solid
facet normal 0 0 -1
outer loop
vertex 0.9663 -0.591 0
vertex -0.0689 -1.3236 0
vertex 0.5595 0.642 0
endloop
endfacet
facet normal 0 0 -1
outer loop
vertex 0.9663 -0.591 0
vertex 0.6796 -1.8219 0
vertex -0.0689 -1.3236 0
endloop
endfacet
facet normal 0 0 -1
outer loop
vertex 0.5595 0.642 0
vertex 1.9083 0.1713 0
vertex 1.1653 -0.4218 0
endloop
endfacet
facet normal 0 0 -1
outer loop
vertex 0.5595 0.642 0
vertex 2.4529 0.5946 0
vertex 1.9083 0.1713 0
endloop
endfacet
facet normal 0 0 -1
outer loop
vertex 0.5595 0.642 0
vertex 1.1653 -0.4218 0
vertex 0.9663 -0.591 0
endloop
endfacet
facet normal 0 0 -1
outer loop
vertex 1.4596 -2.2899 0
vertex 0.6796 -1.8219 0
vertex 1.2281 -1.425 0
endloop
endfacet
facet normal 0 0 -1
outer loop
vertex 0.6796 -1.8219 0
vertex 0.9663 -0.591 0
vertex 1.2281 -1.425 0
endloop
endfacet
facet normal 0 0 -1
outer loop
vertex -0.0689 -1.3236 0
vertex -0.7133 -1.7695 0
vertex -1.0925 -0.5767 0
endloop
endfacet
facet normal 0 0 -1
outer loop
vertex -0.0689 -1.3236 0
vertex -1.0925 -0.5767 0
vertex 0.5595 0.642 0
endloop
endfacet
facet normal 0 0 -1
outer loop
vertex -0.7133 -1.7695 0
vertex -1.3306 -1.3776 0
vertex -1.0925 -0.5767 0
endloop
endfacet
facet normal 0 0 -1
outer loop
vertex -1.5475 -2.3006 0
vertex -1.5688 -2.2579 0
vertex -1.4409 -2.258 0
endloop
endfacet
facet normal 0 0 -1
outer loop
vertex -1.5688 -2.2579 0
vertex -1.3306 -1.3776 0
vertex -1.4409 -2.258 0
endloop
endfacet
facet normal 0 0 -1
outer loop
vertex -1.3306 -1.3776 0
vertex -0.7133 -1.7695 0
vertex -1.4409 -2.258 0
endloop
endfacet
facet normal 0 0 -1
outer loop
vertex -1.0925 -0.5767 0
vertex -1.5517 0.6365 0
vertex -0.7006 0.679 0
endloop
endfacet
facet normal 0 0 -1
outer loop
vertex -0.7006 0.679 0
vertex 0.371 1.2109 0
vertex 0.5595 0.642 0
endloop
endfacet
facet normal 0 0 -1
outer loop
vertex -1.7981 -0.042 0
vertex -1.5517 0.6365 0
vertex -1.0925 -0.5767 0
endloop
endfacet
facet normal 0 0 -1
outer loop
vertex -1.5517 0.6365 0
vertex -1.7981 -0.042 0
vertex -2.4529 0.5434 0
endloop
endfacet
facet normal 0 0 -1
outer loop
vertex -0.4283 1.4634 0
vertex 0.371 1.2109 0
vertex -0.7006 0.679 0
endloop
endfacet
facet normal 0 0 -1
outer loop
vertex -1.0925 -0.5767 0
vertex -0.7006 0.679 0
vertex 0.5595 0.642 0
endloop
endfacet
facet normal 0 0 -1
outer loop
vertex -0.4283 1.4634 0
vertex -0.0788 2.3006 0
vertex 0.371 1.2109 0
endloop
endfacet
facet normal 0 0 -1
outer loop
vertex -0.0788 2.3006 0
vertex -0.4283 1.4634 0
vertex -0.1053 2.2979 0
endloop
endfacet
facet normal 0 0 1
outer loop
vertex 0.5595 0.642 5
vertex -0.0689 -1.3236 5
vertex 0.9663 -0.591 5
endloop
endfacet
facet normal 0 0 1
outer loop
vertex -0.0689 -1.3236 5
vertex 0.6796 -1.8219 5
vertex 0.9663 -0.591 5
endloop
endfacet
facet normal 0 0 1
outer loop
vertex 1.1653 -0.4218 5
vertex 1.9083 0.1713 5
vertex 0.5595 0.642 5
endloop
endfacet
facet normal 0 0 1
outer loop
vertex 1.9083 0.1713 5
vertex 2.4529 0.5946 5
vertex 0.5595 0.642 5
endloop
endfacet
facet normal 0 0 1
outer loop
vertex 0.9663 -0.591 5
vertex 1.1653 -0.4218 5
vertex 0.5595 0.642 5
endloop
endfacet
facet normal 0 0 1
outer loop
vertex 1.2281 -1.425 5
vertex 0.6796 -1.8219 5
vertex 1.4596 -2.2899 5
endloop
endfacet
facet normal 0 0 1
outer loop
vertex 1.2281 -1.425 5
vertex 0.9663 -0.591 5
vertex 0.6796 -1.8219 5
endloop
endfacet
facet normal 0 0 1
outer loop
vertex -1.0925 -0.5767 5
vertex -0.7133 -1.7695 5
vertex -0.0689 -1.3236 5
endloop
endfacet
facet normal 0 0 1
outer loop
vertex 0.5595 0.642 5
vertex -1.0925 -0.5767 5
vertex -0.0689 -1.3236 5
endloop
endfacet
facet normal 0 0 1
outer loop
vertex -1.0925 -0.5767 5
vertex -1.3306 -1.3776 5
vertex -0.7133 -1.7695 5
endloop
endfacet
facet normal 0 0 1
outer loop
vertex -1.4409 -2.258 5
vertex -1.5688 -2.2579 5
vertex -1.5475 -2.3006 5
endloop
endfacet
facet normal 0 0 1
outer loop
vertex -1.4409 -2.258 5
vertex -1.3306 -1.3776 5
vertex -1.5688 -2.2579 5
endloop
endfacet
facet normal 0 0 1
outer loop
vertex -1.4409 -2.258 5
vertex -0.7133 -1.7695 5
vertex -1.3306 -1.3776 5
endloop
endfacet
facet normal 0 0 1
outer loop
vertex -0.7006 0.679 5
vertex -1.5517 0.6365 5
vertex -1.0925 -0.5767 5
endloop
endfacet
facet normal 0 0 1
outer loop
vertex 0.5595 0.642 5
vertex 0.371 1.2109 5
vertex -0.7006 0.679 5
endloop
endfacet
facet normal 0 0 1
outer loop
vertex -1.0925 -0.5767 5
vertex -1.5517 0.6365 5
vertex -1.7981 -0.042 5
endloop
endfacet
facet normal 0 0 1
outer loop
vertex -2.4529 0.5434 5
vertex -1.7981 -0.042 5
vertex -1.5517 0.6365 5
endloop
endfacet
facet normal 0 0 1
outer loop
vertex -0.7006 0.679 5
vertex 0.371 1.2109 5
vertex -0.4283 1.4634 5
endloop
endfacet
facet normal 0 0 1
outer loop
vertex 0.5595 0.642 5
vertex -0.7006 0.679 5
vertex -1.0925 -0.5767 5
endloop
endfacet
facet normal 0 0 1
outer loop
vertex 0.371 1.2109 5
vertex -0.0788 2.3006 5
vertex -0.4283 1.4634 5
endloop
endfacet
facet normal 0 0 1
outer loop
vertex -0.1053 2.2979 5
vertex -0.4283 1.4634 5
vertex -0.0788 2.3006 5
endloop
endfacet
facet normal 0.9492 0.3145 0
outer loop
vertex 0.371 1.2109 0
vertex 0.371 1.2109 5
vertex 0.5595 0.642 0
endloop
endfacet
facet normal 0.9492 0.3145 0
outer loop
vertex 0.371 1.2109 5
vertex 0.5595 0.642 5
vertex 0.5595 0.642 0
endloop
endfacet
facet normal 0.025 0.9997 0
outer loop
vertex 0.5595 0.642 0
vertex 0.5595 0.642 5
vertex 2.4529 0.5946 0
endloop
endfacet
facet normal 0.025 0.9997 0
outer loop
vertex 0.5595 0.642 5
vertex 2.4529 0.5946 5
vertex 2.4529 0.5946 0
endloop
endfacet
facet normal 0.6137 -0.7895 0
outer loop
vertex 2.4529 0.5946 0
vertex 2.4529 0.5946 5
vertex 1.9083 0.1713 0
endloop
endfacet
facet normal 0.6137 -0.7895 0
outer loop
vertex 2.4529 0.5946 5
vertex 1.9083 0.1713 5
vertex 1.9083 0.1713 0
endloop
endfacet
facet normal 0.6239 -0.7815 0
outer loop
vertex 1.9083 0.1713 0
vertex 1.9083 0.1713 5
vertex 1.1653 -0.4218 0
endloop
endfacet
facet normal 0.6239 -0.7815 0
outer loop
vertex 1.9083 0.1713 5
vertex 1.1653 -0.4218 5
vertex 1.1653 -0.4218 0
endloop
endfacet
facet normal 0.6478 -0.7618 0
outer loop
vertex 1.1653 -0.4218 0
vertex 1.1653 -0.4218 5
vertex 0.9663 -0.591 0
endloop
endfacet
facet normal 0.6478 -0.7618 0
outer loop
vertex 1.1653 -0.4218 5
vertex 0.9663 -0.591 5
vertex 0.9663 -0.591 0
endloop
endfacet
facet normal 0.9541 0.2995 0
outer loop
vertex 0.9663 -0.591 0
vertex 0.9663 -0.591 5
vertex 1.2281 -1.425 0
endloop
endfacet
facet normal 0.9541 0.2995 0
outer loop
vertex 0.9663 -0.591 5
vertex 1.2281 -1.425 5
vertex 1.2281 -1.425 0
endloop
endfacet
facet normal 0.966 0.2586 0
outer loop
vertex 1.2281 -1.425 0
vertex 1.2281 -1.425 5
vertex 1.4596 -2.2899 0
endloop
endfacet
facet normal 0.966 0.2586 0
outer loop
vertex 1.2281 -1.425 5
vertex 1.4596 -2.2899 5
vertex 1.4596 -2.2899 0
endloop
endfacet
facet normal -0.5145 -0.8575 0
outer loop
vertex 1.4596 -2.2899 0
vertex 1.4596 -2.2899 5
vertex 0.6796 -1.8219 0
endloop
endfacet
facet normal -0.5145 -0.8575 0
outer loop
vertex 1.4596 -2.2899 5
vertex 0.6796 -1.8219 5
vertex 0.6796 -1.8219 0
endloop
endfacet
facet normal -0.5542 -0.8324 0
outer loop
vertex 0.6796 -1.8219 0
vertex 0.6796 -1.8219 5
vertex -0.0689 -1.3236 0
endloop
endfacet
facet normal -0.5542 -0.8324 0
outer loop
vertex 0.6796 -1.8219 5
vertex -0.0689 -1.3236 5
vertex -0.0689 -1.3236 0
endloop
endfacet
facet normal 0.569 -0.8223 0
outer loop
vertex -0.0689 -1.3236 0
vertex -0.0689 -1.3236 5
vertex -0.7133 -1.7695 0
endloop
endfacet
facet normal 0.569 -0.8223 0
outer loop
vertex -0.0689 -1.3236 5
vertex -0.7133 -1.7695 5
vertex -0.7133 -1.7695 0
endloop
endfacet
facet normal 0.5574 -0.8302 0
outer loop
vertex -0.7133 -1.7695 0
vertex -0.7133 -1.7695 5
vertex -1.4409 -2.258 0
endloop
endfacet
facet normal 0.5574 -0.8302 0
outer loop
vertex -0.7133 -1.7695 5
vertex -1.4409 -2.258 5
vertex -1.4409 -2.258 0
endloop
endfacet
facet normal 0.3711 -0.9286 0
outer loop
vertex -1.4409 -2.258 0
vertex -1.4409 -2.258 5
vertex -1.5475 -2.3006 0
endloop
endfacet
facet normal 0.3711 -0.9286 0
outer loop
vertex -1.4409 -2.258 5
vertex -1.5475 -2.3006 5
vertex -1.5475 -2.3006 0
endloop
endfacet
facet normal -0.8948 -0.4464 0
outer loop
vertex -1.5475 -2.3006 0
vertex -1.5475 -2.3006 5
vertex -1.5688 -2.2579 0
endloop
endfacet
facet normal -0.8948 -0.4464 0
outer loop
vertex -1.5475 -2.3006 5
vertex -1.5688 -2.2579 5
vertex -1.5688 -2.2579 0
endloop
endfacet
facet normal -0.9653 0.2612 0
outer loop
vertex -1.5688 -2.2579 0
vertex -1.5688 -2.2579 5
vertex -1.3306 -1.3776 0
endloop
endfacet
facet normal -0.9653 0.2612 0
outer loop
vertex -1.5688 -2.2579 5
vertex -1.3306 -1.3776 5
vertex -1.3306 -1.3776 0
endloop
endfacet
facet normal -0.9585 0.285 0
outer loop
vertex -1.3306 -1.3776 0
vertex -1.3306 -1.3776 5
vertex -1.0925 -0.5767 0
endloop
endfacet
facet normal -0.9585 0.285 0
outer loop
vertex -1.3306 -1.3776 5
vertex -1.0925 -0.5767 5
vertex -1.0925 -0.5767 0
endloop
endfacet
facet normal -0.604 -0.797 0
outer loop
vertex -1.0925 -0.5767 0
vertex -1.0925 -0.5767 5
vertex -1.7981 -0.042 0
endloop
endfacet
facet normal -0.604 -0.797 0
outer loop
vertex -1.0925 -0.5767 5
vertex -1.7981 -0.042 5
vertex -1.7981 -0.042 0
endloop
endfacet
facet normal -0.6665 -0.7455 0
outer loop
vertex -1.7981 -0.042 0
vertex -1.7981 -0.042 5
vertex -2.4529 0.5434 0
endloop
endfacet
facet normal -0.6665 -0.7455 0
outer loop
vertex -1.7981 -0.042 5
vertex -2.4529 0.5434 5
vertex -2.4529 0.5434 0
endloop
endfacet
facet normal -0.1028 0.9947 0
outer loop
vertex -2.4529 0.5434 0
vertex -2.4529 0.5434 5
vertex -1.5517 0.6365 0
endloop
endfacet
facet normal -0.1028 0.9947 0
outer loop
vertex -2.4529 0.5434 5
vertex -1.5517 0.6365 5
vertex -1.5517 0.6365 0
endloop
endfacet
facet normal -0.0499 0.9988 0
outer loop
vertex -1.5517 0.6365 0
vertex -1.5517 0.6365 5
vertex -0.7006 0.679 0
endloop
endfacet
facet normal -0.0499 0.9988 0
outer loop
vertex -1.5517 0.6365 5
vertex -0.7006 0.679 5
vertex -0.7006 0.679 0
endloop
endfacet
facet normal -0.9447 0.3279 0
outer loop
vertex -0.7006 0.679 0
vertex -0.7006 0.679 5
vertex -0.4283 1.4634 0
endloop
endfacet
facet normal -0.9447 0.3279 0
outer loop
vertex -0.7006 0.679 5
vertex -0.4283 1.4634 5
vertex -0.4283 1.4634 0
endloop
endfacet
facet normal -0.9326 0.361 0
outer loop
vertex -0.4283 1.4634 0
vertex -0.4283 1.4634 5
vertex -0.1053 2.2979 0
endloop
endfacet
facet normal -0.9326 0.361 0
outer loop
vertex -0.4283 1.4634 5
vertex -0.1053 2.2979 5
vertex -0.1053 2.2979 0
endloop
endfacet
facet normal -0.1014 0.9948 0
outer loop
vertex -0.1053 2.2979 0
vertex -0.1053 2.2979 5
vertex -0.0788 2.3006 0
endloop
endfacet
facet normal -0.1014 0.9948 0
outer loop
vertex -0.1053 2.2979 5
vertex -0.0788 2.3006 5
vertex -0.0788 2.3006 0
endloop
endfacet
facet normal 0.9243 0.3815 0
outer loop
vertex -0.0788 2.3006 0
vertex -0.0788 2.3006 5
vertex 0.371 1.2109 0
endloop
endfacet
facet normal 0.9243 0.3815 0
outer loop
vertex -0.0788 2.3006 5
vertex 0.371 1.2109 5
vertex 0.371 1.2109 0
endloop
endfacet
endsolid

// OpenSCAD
// Module names are of the form poly_<inkscape-path-id>().  As a result,
// you can associate a polygon in this OpenSCAD program with the corresponding
// SVG element in the Inkscape document by looking for the XML element with
// the attribute id="inkscape-path-id".

// fudge value is used to ensure that subtracted solids are a tad taller
// in the z dimension than the polygon being subtracted from.  This helps
// keep the resulting .stl file manifold.
fudge = 0.1;

module poly_path3346(h)
{
  scale([25.4/90, -25.4/90, 1]) union()
  {
    linear_extrude(height=h)
      polygon([[-0.279297,-8.151912],[-0.373047,-8.142152],[-1.517578,-5.185122],[-2.482422,-2.405822],[-5.498047,-2.255432],[-8.691406,-1.925352],[-6.371094,0.148868],[-3.871094,2.043398],[-4.714844,4.881288],[-5.558594,8.000428],[-5.483400,8.151912],[-5.105474,8.000659],[-2.527344,6.269958],[-0.244140,4.689878],[2.408203,6.455508],[5.171875,8.113708],[4.351563,5.049258],[3.423828,2.094178],[4.128906,1.494568],[6.761719,-0.606992],[8.691406,-2.106992],[5.335937,-2.190982],[1.982422,-2.274962],[1.314453,-4.290592],[-0.279297,-8.151912]]);
  }
}

poly_path3346(5);
